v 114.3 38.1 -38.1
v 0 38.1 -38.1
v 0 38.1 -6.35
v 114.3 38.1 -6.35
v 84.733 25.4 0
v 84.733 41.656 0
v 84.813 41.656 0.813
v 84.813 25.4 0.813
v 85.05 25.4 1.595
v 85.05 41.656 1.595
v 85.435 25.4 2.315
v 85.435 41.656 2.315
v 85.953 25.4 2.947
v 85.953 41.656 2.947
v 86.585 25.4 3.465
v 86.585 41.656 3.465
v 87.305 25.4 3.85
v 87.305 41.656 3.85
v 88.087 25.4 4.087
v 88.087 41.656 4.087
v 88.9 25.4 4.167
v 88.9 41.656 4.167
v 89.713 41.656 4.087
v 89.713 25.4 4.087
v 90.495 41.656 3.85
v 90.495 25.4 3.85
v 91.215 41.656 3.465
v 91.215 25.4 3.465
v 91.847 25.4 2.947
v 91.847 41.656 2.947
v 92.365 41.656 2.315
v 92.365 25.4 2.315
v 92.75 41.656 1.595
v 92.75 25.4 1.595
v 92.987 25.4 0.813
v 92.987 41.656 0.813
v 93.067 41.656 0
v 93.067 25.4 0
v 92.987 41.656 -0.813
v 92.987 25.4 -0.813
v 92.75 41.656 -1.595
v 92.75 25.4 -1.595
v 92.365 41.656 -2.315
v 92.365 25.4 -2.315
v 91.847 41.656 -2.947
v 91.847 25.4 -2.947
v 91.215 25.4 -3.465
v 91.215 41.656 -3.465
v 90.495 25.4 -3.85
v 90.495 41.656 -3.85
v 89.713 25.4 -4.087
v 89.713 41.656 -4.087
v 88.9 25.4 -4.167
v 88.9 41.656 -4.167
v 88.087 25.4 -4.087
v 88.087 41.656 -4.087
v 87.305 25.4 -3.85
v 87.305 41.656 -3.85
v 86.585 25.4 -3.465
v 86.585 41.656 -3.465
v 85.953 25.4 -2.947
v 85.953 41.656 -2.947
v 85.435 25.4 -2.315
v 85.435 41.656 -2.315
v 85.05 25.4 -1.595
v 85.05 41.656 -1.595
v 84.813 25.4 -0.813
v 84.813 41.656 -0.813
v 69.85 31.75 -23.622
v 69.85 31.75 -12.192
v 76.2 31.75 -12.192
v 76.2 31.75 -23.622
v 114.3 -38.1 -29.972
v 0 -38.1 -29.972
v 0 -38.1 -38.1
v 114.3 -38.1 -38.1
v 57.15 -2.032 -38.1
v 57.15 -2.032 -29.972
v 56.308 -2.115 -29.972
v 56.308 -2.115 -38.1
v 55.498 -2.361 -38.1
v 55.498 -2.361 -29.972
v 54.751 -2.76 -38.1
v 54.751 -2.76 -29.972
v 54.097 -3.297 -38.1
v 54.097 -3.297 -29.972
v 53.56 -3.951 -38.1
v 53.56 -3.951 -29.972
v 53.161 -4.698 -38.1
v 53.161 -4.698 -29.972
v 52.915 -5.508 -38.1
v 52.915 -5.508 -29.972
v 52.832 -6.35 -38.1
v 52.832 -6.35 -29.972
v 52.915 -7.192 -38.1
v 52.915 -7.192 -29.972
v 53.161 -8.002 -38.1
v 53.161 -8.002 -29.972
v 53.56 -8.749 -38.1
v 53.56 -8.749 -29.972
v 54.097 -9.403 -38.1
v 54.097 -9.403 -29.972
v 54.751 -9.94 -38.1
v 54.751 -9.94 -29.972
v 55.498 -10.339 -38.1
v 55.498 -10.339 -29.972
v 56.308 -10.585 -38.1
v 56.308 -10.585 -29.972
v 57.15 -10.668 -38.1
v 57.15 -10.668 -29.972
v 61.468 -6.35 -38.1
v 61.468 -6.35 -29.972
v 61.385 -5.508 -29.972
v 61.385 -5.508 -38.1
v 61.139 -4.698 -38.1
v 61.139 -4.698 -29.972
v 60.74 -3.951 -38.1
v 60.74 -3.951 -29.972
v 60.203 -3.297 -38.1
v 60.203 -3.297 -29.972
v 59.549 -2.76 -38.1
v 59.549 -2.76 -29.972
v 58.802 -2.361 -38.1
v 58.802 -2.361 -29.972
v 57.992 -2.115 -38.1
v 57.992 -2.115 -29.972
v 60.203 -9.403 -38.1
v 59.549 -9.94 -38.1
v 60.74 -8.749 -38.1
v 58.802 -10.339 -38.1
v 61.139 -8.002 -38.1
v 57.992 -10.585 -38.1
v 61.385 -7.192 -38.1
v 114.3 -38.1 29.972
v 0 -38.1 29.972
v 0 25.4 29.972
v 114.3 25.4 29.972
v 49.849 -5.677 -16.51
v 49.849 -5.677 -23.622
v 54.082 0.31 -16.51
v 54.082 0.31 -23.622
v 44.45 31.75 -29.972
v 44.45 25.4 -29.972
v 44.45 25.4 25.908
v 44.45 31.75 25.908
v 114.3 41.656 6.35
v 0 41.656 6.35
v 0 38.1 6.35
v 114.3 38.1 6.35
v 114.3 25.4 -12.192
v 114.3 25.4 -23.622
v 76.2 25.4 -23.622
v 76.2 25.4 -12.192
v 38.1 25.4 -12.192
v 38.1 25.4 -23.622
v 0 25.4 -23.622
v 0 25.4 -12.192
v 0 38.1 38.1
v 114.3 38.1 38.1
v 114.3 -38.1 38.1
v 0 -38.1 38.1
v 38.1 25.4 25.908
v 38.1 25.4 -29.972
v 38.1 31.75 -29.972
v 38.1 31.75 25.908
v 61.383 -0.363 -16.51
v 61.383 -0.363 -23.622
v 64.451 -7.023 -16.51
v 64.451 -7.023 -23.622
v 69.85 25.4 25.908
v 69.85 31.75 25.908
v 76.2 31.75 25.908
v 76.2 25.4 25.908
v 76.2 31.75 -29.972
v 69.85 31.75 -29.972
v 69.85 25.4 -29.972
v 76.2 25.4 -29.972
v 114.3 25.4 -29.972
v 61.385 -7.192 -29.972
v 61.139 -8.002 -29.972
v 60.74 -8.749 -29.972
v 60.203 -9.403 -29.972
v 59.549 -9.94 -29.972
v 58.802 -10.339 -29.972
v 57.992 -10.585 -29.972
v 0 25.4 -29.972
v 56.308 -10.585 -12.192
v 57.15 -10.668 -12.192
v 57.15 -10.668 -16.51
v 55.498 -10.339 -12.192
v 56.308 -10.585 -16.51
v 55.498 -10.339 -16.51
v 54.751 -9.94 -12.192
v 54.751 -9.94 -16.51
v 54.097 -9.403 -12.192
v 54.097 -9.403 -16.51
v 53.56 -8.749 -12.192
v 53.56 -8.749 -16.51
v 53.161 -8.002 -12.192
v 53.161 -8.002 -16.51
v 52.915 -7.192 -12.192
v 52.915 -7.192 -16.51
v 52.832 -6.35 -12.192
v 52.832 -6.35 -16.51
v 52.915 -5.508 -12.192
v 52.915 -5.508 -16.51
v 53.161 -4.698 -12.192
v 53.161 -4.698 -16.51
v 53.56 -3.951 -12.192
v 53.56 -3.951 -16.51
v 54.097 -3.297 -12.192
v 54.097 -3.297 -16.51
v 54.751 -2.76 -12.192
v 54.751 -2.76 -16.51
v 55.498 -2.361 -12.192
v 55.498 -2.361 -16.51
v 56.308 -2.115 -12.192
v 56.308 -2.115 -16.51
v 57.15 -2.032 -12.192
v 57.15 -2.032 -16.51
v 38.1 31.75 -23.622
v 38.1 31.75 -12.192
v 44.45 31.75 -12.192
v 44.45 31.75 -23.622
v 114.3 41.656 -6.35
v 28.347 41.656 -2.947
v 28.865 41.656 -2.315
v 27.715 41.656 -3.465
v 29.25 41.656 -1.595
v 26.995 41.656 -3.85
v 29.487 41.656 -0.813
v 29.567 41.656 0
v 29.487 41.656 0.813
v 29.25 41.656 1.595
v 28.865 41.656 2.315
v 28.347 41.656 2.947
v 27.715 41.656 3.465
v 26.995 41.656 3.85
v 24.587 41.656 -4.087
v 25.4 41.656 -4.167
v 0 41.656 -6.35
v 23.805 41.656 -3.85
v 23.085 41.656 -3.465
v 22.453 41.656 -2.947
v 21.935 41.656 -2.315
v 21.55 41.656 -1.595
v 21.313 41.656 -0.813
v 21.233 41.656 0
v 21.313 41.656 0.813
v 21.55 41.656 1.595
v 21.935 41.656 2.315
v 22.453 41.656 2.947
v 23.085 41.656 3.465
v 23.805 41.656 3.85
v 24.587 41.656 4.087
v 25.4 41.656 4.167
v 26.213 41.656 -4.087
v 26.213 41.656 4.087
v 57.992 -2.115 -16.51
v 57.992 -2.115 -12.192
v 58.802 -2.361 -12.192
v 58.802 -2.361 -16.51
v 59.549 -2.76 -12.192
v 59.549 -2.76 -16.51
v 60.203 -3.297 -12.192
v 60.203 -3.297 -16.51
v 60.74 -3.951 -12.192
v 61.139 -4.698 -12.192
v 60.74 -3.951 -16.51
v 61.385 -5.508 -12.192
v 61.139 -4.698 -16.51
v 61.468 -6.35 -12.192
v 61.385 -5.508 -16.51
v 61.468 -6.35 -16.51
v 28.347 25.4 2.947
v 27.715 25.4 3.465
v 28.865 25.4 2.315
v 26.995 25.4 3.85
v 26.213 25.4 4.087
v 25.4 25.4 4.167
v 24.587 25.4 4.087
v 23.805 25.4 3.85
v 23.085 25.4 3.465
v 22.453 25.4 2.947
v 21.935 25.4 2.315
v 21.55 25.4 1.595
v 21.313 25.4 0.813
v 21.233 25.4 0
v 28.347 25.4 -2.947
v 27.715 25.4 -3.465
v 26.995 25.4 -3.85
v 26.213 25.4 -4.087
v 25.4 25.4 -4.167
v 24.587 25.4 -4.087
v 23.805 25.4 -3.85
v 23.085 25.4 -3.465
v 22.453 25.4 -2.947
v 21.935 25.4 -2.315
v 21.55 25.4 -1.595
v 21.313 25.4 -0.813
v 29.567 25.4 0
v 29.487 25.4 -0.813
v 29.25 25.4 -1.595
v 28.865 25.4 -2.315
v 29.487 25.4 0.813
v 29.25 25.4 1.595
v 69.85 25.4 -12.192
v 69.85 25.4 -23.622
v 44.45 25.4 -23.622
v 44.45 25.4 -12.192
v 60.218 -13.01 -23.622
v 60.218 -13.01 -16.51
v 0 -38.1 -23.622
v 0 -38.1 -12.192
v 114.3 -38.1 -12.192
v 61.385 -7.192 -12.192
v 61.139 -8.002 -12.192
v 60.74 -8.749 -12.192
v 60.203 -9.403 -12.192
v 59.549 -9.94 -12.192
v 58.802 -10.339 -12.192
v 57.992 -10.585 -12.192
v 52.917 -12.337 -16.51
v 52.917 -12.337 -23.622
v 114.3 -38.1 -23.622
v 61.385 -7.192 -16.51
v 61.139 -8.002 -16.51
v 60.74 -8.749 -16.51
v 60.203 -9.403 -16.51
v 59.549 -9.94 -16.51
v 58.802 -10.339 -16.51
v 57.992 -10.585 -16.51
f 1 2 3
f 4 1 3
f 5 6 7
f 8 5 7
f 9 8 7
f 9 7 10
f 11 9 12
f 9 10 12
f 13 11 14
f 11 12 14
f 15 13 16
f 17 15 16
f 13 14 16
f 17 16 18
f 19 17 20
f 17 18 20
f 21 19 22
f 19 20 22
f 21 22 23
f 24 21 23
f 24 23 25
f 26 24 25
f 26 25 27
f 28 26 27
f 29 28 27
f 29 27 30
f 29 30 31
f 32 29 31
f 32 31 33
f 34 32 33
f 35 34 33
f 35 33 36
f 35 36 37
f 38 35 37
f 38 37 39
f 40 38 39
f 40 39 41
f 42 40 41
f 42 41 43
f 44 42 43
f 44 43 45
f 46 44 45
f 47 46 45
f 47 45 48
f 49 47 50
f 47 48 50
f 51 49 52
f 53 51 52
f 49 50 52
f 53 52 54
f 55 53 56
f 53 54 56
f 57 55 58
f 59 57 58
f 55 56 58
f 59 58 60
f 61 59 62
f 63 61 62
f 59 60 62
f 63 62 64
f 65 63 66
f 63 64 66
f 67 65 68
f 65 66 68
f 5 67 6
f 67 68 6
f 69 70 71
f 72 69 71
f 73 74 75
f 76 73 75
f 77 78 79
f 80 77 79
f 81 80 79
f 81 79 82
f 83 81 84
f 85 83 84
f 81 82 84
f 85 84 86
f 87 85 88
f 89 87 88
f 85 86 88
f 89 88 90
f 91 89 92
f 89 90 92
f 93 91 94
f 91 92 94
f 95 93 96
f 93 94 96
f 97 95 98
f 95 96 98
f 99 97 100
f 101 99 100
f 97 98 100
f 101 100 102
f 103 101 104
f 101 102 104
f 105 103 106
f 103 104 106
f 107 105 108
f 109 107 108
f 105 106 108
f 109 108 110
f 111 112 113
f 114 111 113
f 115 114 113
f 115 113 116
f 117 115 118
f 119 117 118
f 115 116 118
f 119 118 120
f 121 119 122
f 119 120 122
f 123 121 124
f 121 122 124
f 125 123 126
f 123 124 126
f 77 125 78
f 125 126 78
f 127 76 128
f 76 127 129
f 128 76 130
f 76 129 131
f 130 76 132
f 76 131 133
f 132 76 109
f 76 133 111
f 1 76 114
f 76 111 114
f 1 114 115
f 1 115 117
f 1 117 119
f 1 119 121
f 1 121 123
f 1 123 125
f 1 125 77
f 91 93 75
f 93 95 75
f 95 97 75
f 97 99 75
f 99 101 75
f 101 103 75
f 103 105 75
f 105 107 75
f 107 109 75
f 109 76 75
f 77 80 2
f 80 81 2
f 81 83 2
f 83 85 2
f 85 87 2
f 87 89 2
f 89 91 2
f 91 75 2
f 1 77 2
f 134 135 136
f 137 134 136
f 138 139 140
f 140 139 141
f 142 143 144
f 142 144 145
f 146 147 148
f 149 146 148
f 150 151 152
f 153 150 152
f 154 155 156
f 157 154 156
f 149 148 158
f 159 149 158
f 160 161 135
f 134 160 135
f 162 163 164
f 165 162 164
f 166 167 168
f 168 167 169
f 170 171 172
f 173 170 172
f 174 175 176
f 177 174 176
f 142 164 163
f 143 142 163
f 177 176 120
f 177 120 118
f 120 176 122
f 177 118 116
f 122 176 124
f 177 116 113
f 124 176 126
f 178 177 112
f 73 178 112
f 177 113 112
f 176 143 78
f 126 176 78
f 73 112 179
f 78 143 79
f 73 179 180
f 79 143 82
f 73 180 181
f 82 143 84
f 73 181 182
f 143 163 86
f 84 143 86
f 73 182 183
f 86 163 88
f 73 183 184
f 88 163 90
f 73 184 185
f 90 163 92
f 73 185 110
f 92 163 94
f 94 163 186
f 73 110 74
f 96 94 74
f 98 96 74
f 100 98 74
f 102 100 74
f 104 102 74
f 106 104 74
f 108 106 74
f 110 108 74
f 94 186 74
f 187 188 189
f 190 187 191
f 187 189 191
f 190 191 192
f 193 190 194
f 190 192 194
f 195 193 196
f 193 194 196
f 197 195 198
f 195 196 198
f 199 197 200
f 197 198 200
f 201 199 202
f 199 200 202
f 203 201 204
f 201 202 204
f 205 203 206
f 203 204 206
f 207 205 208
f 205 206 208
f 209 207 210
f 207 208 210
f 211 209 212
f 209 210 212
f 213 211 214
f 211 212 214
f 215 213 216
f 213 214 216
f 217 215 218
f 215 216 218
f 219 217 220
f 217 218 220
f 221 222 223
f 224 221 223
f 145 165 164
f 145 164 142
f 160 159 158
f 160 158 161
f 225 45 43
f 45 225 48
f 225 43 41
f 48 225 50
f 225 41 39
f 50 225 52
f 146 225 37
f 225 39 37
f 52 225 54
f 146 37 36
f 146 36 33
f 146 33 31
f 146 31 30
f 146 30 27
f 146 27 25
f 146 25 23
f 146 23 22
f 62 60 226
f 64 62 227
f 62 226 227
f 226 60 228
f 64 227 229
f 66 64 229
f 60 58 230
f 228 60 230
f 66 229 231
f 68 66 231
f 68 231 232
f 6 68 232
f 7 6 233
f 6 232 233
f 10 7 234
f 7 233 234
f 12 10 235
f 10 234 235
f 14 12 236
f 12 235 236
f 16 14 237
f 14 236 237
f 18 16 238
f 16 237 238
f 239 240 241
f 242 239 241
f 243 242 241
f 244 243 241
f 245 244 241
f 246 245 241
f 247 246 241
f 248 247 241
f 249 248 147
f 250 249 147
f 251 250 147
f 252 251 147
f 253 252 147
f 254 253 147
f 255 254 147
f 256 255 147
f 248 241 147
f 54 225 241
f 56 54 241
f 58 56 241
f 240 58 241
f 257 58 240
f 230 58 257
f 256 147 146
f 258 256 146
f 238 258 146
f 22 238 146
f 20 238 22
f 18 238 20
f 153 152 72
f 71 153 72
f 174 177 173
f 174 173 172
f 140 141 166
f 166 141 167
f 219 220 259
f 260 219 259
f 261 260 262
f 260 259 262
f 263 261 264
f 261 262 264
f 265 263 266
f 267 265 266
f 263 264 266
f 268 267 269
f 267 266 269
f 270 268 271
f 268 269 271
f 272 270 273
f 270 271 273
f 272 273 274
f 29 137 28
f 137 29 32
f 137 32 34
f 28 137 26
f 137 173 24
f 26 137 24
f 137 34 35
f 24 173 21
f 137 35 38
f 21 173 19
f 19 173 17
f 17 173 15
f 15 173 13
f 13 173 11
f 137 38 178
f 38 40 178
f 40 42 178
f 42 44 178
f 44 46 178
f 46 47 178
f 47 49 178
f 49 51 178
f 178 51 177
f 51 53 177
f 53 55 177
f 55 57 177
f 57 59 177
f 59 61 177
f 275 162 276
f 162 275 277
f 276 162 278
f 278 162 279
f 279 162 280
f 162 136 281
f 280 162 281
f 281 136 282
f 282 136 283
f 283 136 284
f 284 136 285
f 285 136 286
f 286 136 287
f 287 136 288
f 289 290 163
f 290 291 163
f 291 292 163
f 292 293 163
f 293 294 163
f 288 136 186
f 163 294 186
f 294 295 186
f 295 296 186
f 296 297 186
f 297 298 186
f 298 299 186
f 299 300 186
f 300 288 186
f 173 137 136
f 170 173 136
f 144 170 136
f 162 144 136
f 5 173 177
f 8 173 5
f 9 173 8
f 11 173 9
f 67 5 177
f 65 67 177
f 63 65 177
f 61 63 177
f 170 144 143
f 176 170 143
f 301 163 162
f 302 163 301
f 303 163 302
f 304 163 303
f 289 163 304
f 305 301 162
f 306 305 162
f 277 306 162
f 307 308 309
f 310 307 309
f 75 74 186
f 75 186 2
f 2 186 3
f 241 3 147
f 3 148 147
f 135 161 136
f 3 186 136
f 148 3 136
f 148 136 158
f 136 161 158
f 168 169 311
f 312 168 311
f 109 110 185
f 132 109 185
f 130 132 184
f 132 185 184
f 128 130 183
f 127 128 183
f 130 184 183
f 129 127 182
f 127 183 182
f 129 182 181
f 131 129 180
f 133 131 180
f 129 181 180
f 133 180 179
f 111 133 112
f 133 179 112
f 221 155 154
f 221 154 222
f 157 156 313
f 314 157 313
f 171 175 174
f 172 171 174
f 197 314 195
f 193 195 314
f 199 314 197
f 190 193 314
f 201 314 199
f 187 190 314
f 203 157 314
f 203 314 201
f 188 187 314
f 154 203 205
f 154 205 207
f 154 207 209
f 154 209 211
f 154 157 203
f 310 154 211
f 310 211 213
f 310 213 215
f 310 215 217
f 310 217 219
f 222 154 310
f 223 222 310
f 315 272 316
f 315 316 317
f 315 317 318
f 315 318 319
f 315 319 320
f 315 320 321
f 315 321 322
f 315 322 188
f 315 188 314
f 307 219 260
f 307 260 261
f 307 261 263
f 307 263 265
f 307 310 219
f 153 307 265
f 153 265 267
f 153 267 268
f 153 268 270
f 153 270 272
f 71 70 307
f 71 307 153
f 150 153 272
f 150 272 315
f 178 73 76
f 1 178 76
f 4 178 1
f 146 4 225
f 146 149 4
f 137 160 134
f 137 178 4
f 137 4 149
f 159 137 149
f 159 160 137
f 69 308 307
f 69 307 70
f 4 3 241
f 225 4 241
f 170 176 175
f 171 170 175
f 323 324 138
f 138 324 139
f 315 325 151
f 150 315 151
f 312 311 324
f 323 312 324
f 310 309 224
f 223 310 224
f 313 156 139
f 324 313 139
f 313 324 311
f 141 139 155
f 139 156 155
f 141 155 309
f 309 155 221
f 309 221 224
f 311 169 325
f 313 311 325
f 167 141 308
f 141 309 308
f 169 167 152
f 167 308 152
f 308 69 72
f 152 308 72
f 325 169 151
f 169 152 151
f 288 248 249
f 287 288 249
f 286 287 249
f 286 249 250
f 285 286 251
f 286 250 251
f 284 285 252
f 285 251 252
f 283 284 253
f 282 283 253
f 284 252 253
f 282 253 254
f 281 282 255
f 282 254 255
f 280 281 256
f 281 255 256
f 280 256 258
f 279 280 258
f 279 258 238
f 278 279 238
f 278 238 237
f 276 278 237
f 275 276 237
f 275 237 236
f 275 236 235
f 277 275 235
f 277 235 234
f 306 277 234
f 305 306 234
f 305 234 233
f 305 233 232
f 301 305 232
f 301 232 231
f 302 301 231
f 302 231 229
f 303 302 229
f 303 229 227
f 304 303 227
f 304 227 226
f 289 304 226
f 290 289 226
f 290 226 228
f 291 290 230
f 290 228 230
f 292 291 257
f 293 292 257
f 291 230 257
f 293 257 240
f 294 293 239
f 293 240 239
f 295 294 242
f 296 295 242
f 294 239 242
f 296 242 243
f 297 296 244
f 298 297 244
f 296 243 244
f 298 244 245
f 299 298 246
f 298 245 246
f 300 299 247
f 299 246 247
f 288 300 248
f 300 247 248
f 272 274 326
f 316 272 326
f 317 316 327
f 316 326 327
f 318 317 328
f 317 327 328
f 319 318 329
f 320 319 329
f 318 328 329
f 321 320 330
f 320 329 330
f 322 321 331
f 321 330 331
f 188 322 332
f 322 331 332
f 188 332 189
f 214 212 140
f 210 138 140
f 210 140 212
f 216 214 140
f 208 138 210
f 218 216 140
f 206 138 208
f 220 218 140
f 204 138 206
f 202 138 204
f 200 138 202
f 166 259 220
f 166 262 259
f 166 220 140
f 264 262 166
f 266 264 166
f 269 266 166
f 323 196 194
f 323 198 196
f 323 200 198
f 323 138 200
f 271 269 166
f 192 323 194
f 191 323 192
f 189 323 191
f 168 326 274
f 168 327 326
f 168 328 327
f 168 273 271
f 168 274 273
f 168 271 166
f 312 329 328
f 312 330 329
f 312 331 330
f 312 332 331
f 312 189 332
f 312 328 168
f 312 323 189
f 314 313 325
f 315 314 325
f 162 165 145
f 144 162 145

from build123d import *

# Parameters (mm, degrees)
F1_DEPTH = 114.3
F3_D     = 8.334375
F5_DEPTH = 12.7
F4_W     = 6.35
F4_H     = 6.35
F4_W_2   = 6.3500022411
F6_DEPTH = 55.88
F7_START = 6.35
F7_DEPTH = 11.43
F8_R     = 4.318
F9_DEPTH = 7.112


# Not quite as in the source:
# - a length typed as a fraction of an inch, garbled in the dataset ("3 / 203.2 mm" for 3/8 in), is restored


with BuildPart() as f1:
    # F0 (on Right) → F1 (new body)
    with BuildSketch(Plane.YZ):
        Polygon((-38.1, -29.972), (-38.1, -38.1), (38.1, -38.1), (38.1, -6.35), (41.656, -6.35), (41.656, 6.35), (38.1, 6.35), (38.1, 38.1), (-38.1, 38.1), (-38.1, 29.972), (25.4, 29.972), (25.4, 2.3702074885), (25.4, -29.972), align=None)
    extrude(amount=F1_DEPTH)

    # F3 (through all)
    with Locations(Plane.XZ.offset(-25.4)):
        with Locations((25.4, 0), (88.9, 0)):
            Hole(F3_D / 2)

    # F4 (on face) → F5 (cut)
    with BuildSketch(Plane.XY.offset(-29.972)):
        with BuildLine():
            ThreePointArc((57.1499993635, -2.032), (52.8319994397, -6.3500000762), (57.1499995159, -10.668))
            Line((57.1499995159, -10.668), (57.1499993635, -2.032))
        make_face()
        with BuildLine():
            Line((57.1499993635, -2.032), (57.1499995159, -10.668))
            ThreePointArc((57.1499995159, -10.668), (60.2032865478, -9.4032870542), (61.4679994397, -6.35))
            ThreePointArc((61.4679994397, -6.35), (60.2032864939, -3.2967128919), (57.1499993635, -2.032))
        make_face()
    extrude(amount=-F5_DEPTH, mode=Mode.SUBTRACT)

    # F4 (on face) → F6 (cut)
    with BuildSketch(Plane.XY.offset(-29.972)):
        with Locations((41.275, 28.575)):
            Rectangle(F4_W, F4_H)
        with Locations((73.0249988794, 28.575)):
            Rectangle(F4_W_2, F4_H)
    extrude(amount=F6_DEPTH, mode=Mode.SUBTRACT)


with BuildPart() as f7:
    # F4 (on face) → F7 (new body)
    with BuildSketch(Plane.XY.offset(-29.972).offset(F7_START)):
        with BuildLine():
            Line((0, -38.1), (57.15, -38.1))
            Line((57.15, -38.1), (57.1499995159, -10.668))
            ThreePointArc((57.1499995159, -10.668), (52.8319994397, -6.3500000762), (57.1499993635, -2.032))
            Line((57.1499993635, -2.032), (57.1499988794, 25.4))
            Line((57.1499988794, 25.4), (44.45, 25.4))
            Line((44.45, 25.4), (38.1, 25.4))
            Line((38.1, 25.4), (0, 25.4))
            Line((0, 25.4), (0, -38.1))
        make_face()
        with Locations((41.275, 28.575)):
            Rectangle(F4_W, F4_H)
        with Locations((73.0249988794, 28.575)):
            Rectangle(F4_W_2, F4_H)
        with BuildLine():
            Line((114.3, -38.1), (114.3, 25.4))
            Line((114.3, 25.4), (76.2, 25.4))
            Line((76.2, 25.4), (69.8499977589, 25.4))
            Line((69.8499977589, 25.4), (57.1499988794, 25.4))
            Line((57.1499988794, 25.4), (57.1499993635, -2.032))
            ThreePointArc((57.1499993635, -2.032), (60.2032864939, -3.2967128919), (61.4679994397, -6.35))
            ThreePointArc((61.4679994397, -6.35), (60.2032865478, -9.4032870542), (57.1499995159, -10.668))
            Line((57.1499995159, -10.668), (57.15, -38.1))
            Line((57.15, -38.1), (114.3, -38.1))
        make_face()
    extrude(amount=F7_DEPTH)

    # F8 (on face) → F9 (cut)
    with BuildSketch(Plane(origin=(0, 0, -23.622), x_dir=(1, 0, 0), z_dir=(0, 0, -1))):
        Polygon((60.2179755791, 13.0096438149), (52.9165667855, 12.3367671824), (49.8485906462, 5.6771233675), (54.0820233003, -0.3096438149), (61.3834320939, 0.3632328176), (64.4514082333, 7.0228766325), align=None)
        with Locations((57.1499994397, 6.35)):
            Circle(F8_R, mode=Mode.SUBTRACT)
    extrude(amount=-F9_DEPTH, mode=Mode.SUBTRACT)


solid = Compound([f1.part, f7.part])
